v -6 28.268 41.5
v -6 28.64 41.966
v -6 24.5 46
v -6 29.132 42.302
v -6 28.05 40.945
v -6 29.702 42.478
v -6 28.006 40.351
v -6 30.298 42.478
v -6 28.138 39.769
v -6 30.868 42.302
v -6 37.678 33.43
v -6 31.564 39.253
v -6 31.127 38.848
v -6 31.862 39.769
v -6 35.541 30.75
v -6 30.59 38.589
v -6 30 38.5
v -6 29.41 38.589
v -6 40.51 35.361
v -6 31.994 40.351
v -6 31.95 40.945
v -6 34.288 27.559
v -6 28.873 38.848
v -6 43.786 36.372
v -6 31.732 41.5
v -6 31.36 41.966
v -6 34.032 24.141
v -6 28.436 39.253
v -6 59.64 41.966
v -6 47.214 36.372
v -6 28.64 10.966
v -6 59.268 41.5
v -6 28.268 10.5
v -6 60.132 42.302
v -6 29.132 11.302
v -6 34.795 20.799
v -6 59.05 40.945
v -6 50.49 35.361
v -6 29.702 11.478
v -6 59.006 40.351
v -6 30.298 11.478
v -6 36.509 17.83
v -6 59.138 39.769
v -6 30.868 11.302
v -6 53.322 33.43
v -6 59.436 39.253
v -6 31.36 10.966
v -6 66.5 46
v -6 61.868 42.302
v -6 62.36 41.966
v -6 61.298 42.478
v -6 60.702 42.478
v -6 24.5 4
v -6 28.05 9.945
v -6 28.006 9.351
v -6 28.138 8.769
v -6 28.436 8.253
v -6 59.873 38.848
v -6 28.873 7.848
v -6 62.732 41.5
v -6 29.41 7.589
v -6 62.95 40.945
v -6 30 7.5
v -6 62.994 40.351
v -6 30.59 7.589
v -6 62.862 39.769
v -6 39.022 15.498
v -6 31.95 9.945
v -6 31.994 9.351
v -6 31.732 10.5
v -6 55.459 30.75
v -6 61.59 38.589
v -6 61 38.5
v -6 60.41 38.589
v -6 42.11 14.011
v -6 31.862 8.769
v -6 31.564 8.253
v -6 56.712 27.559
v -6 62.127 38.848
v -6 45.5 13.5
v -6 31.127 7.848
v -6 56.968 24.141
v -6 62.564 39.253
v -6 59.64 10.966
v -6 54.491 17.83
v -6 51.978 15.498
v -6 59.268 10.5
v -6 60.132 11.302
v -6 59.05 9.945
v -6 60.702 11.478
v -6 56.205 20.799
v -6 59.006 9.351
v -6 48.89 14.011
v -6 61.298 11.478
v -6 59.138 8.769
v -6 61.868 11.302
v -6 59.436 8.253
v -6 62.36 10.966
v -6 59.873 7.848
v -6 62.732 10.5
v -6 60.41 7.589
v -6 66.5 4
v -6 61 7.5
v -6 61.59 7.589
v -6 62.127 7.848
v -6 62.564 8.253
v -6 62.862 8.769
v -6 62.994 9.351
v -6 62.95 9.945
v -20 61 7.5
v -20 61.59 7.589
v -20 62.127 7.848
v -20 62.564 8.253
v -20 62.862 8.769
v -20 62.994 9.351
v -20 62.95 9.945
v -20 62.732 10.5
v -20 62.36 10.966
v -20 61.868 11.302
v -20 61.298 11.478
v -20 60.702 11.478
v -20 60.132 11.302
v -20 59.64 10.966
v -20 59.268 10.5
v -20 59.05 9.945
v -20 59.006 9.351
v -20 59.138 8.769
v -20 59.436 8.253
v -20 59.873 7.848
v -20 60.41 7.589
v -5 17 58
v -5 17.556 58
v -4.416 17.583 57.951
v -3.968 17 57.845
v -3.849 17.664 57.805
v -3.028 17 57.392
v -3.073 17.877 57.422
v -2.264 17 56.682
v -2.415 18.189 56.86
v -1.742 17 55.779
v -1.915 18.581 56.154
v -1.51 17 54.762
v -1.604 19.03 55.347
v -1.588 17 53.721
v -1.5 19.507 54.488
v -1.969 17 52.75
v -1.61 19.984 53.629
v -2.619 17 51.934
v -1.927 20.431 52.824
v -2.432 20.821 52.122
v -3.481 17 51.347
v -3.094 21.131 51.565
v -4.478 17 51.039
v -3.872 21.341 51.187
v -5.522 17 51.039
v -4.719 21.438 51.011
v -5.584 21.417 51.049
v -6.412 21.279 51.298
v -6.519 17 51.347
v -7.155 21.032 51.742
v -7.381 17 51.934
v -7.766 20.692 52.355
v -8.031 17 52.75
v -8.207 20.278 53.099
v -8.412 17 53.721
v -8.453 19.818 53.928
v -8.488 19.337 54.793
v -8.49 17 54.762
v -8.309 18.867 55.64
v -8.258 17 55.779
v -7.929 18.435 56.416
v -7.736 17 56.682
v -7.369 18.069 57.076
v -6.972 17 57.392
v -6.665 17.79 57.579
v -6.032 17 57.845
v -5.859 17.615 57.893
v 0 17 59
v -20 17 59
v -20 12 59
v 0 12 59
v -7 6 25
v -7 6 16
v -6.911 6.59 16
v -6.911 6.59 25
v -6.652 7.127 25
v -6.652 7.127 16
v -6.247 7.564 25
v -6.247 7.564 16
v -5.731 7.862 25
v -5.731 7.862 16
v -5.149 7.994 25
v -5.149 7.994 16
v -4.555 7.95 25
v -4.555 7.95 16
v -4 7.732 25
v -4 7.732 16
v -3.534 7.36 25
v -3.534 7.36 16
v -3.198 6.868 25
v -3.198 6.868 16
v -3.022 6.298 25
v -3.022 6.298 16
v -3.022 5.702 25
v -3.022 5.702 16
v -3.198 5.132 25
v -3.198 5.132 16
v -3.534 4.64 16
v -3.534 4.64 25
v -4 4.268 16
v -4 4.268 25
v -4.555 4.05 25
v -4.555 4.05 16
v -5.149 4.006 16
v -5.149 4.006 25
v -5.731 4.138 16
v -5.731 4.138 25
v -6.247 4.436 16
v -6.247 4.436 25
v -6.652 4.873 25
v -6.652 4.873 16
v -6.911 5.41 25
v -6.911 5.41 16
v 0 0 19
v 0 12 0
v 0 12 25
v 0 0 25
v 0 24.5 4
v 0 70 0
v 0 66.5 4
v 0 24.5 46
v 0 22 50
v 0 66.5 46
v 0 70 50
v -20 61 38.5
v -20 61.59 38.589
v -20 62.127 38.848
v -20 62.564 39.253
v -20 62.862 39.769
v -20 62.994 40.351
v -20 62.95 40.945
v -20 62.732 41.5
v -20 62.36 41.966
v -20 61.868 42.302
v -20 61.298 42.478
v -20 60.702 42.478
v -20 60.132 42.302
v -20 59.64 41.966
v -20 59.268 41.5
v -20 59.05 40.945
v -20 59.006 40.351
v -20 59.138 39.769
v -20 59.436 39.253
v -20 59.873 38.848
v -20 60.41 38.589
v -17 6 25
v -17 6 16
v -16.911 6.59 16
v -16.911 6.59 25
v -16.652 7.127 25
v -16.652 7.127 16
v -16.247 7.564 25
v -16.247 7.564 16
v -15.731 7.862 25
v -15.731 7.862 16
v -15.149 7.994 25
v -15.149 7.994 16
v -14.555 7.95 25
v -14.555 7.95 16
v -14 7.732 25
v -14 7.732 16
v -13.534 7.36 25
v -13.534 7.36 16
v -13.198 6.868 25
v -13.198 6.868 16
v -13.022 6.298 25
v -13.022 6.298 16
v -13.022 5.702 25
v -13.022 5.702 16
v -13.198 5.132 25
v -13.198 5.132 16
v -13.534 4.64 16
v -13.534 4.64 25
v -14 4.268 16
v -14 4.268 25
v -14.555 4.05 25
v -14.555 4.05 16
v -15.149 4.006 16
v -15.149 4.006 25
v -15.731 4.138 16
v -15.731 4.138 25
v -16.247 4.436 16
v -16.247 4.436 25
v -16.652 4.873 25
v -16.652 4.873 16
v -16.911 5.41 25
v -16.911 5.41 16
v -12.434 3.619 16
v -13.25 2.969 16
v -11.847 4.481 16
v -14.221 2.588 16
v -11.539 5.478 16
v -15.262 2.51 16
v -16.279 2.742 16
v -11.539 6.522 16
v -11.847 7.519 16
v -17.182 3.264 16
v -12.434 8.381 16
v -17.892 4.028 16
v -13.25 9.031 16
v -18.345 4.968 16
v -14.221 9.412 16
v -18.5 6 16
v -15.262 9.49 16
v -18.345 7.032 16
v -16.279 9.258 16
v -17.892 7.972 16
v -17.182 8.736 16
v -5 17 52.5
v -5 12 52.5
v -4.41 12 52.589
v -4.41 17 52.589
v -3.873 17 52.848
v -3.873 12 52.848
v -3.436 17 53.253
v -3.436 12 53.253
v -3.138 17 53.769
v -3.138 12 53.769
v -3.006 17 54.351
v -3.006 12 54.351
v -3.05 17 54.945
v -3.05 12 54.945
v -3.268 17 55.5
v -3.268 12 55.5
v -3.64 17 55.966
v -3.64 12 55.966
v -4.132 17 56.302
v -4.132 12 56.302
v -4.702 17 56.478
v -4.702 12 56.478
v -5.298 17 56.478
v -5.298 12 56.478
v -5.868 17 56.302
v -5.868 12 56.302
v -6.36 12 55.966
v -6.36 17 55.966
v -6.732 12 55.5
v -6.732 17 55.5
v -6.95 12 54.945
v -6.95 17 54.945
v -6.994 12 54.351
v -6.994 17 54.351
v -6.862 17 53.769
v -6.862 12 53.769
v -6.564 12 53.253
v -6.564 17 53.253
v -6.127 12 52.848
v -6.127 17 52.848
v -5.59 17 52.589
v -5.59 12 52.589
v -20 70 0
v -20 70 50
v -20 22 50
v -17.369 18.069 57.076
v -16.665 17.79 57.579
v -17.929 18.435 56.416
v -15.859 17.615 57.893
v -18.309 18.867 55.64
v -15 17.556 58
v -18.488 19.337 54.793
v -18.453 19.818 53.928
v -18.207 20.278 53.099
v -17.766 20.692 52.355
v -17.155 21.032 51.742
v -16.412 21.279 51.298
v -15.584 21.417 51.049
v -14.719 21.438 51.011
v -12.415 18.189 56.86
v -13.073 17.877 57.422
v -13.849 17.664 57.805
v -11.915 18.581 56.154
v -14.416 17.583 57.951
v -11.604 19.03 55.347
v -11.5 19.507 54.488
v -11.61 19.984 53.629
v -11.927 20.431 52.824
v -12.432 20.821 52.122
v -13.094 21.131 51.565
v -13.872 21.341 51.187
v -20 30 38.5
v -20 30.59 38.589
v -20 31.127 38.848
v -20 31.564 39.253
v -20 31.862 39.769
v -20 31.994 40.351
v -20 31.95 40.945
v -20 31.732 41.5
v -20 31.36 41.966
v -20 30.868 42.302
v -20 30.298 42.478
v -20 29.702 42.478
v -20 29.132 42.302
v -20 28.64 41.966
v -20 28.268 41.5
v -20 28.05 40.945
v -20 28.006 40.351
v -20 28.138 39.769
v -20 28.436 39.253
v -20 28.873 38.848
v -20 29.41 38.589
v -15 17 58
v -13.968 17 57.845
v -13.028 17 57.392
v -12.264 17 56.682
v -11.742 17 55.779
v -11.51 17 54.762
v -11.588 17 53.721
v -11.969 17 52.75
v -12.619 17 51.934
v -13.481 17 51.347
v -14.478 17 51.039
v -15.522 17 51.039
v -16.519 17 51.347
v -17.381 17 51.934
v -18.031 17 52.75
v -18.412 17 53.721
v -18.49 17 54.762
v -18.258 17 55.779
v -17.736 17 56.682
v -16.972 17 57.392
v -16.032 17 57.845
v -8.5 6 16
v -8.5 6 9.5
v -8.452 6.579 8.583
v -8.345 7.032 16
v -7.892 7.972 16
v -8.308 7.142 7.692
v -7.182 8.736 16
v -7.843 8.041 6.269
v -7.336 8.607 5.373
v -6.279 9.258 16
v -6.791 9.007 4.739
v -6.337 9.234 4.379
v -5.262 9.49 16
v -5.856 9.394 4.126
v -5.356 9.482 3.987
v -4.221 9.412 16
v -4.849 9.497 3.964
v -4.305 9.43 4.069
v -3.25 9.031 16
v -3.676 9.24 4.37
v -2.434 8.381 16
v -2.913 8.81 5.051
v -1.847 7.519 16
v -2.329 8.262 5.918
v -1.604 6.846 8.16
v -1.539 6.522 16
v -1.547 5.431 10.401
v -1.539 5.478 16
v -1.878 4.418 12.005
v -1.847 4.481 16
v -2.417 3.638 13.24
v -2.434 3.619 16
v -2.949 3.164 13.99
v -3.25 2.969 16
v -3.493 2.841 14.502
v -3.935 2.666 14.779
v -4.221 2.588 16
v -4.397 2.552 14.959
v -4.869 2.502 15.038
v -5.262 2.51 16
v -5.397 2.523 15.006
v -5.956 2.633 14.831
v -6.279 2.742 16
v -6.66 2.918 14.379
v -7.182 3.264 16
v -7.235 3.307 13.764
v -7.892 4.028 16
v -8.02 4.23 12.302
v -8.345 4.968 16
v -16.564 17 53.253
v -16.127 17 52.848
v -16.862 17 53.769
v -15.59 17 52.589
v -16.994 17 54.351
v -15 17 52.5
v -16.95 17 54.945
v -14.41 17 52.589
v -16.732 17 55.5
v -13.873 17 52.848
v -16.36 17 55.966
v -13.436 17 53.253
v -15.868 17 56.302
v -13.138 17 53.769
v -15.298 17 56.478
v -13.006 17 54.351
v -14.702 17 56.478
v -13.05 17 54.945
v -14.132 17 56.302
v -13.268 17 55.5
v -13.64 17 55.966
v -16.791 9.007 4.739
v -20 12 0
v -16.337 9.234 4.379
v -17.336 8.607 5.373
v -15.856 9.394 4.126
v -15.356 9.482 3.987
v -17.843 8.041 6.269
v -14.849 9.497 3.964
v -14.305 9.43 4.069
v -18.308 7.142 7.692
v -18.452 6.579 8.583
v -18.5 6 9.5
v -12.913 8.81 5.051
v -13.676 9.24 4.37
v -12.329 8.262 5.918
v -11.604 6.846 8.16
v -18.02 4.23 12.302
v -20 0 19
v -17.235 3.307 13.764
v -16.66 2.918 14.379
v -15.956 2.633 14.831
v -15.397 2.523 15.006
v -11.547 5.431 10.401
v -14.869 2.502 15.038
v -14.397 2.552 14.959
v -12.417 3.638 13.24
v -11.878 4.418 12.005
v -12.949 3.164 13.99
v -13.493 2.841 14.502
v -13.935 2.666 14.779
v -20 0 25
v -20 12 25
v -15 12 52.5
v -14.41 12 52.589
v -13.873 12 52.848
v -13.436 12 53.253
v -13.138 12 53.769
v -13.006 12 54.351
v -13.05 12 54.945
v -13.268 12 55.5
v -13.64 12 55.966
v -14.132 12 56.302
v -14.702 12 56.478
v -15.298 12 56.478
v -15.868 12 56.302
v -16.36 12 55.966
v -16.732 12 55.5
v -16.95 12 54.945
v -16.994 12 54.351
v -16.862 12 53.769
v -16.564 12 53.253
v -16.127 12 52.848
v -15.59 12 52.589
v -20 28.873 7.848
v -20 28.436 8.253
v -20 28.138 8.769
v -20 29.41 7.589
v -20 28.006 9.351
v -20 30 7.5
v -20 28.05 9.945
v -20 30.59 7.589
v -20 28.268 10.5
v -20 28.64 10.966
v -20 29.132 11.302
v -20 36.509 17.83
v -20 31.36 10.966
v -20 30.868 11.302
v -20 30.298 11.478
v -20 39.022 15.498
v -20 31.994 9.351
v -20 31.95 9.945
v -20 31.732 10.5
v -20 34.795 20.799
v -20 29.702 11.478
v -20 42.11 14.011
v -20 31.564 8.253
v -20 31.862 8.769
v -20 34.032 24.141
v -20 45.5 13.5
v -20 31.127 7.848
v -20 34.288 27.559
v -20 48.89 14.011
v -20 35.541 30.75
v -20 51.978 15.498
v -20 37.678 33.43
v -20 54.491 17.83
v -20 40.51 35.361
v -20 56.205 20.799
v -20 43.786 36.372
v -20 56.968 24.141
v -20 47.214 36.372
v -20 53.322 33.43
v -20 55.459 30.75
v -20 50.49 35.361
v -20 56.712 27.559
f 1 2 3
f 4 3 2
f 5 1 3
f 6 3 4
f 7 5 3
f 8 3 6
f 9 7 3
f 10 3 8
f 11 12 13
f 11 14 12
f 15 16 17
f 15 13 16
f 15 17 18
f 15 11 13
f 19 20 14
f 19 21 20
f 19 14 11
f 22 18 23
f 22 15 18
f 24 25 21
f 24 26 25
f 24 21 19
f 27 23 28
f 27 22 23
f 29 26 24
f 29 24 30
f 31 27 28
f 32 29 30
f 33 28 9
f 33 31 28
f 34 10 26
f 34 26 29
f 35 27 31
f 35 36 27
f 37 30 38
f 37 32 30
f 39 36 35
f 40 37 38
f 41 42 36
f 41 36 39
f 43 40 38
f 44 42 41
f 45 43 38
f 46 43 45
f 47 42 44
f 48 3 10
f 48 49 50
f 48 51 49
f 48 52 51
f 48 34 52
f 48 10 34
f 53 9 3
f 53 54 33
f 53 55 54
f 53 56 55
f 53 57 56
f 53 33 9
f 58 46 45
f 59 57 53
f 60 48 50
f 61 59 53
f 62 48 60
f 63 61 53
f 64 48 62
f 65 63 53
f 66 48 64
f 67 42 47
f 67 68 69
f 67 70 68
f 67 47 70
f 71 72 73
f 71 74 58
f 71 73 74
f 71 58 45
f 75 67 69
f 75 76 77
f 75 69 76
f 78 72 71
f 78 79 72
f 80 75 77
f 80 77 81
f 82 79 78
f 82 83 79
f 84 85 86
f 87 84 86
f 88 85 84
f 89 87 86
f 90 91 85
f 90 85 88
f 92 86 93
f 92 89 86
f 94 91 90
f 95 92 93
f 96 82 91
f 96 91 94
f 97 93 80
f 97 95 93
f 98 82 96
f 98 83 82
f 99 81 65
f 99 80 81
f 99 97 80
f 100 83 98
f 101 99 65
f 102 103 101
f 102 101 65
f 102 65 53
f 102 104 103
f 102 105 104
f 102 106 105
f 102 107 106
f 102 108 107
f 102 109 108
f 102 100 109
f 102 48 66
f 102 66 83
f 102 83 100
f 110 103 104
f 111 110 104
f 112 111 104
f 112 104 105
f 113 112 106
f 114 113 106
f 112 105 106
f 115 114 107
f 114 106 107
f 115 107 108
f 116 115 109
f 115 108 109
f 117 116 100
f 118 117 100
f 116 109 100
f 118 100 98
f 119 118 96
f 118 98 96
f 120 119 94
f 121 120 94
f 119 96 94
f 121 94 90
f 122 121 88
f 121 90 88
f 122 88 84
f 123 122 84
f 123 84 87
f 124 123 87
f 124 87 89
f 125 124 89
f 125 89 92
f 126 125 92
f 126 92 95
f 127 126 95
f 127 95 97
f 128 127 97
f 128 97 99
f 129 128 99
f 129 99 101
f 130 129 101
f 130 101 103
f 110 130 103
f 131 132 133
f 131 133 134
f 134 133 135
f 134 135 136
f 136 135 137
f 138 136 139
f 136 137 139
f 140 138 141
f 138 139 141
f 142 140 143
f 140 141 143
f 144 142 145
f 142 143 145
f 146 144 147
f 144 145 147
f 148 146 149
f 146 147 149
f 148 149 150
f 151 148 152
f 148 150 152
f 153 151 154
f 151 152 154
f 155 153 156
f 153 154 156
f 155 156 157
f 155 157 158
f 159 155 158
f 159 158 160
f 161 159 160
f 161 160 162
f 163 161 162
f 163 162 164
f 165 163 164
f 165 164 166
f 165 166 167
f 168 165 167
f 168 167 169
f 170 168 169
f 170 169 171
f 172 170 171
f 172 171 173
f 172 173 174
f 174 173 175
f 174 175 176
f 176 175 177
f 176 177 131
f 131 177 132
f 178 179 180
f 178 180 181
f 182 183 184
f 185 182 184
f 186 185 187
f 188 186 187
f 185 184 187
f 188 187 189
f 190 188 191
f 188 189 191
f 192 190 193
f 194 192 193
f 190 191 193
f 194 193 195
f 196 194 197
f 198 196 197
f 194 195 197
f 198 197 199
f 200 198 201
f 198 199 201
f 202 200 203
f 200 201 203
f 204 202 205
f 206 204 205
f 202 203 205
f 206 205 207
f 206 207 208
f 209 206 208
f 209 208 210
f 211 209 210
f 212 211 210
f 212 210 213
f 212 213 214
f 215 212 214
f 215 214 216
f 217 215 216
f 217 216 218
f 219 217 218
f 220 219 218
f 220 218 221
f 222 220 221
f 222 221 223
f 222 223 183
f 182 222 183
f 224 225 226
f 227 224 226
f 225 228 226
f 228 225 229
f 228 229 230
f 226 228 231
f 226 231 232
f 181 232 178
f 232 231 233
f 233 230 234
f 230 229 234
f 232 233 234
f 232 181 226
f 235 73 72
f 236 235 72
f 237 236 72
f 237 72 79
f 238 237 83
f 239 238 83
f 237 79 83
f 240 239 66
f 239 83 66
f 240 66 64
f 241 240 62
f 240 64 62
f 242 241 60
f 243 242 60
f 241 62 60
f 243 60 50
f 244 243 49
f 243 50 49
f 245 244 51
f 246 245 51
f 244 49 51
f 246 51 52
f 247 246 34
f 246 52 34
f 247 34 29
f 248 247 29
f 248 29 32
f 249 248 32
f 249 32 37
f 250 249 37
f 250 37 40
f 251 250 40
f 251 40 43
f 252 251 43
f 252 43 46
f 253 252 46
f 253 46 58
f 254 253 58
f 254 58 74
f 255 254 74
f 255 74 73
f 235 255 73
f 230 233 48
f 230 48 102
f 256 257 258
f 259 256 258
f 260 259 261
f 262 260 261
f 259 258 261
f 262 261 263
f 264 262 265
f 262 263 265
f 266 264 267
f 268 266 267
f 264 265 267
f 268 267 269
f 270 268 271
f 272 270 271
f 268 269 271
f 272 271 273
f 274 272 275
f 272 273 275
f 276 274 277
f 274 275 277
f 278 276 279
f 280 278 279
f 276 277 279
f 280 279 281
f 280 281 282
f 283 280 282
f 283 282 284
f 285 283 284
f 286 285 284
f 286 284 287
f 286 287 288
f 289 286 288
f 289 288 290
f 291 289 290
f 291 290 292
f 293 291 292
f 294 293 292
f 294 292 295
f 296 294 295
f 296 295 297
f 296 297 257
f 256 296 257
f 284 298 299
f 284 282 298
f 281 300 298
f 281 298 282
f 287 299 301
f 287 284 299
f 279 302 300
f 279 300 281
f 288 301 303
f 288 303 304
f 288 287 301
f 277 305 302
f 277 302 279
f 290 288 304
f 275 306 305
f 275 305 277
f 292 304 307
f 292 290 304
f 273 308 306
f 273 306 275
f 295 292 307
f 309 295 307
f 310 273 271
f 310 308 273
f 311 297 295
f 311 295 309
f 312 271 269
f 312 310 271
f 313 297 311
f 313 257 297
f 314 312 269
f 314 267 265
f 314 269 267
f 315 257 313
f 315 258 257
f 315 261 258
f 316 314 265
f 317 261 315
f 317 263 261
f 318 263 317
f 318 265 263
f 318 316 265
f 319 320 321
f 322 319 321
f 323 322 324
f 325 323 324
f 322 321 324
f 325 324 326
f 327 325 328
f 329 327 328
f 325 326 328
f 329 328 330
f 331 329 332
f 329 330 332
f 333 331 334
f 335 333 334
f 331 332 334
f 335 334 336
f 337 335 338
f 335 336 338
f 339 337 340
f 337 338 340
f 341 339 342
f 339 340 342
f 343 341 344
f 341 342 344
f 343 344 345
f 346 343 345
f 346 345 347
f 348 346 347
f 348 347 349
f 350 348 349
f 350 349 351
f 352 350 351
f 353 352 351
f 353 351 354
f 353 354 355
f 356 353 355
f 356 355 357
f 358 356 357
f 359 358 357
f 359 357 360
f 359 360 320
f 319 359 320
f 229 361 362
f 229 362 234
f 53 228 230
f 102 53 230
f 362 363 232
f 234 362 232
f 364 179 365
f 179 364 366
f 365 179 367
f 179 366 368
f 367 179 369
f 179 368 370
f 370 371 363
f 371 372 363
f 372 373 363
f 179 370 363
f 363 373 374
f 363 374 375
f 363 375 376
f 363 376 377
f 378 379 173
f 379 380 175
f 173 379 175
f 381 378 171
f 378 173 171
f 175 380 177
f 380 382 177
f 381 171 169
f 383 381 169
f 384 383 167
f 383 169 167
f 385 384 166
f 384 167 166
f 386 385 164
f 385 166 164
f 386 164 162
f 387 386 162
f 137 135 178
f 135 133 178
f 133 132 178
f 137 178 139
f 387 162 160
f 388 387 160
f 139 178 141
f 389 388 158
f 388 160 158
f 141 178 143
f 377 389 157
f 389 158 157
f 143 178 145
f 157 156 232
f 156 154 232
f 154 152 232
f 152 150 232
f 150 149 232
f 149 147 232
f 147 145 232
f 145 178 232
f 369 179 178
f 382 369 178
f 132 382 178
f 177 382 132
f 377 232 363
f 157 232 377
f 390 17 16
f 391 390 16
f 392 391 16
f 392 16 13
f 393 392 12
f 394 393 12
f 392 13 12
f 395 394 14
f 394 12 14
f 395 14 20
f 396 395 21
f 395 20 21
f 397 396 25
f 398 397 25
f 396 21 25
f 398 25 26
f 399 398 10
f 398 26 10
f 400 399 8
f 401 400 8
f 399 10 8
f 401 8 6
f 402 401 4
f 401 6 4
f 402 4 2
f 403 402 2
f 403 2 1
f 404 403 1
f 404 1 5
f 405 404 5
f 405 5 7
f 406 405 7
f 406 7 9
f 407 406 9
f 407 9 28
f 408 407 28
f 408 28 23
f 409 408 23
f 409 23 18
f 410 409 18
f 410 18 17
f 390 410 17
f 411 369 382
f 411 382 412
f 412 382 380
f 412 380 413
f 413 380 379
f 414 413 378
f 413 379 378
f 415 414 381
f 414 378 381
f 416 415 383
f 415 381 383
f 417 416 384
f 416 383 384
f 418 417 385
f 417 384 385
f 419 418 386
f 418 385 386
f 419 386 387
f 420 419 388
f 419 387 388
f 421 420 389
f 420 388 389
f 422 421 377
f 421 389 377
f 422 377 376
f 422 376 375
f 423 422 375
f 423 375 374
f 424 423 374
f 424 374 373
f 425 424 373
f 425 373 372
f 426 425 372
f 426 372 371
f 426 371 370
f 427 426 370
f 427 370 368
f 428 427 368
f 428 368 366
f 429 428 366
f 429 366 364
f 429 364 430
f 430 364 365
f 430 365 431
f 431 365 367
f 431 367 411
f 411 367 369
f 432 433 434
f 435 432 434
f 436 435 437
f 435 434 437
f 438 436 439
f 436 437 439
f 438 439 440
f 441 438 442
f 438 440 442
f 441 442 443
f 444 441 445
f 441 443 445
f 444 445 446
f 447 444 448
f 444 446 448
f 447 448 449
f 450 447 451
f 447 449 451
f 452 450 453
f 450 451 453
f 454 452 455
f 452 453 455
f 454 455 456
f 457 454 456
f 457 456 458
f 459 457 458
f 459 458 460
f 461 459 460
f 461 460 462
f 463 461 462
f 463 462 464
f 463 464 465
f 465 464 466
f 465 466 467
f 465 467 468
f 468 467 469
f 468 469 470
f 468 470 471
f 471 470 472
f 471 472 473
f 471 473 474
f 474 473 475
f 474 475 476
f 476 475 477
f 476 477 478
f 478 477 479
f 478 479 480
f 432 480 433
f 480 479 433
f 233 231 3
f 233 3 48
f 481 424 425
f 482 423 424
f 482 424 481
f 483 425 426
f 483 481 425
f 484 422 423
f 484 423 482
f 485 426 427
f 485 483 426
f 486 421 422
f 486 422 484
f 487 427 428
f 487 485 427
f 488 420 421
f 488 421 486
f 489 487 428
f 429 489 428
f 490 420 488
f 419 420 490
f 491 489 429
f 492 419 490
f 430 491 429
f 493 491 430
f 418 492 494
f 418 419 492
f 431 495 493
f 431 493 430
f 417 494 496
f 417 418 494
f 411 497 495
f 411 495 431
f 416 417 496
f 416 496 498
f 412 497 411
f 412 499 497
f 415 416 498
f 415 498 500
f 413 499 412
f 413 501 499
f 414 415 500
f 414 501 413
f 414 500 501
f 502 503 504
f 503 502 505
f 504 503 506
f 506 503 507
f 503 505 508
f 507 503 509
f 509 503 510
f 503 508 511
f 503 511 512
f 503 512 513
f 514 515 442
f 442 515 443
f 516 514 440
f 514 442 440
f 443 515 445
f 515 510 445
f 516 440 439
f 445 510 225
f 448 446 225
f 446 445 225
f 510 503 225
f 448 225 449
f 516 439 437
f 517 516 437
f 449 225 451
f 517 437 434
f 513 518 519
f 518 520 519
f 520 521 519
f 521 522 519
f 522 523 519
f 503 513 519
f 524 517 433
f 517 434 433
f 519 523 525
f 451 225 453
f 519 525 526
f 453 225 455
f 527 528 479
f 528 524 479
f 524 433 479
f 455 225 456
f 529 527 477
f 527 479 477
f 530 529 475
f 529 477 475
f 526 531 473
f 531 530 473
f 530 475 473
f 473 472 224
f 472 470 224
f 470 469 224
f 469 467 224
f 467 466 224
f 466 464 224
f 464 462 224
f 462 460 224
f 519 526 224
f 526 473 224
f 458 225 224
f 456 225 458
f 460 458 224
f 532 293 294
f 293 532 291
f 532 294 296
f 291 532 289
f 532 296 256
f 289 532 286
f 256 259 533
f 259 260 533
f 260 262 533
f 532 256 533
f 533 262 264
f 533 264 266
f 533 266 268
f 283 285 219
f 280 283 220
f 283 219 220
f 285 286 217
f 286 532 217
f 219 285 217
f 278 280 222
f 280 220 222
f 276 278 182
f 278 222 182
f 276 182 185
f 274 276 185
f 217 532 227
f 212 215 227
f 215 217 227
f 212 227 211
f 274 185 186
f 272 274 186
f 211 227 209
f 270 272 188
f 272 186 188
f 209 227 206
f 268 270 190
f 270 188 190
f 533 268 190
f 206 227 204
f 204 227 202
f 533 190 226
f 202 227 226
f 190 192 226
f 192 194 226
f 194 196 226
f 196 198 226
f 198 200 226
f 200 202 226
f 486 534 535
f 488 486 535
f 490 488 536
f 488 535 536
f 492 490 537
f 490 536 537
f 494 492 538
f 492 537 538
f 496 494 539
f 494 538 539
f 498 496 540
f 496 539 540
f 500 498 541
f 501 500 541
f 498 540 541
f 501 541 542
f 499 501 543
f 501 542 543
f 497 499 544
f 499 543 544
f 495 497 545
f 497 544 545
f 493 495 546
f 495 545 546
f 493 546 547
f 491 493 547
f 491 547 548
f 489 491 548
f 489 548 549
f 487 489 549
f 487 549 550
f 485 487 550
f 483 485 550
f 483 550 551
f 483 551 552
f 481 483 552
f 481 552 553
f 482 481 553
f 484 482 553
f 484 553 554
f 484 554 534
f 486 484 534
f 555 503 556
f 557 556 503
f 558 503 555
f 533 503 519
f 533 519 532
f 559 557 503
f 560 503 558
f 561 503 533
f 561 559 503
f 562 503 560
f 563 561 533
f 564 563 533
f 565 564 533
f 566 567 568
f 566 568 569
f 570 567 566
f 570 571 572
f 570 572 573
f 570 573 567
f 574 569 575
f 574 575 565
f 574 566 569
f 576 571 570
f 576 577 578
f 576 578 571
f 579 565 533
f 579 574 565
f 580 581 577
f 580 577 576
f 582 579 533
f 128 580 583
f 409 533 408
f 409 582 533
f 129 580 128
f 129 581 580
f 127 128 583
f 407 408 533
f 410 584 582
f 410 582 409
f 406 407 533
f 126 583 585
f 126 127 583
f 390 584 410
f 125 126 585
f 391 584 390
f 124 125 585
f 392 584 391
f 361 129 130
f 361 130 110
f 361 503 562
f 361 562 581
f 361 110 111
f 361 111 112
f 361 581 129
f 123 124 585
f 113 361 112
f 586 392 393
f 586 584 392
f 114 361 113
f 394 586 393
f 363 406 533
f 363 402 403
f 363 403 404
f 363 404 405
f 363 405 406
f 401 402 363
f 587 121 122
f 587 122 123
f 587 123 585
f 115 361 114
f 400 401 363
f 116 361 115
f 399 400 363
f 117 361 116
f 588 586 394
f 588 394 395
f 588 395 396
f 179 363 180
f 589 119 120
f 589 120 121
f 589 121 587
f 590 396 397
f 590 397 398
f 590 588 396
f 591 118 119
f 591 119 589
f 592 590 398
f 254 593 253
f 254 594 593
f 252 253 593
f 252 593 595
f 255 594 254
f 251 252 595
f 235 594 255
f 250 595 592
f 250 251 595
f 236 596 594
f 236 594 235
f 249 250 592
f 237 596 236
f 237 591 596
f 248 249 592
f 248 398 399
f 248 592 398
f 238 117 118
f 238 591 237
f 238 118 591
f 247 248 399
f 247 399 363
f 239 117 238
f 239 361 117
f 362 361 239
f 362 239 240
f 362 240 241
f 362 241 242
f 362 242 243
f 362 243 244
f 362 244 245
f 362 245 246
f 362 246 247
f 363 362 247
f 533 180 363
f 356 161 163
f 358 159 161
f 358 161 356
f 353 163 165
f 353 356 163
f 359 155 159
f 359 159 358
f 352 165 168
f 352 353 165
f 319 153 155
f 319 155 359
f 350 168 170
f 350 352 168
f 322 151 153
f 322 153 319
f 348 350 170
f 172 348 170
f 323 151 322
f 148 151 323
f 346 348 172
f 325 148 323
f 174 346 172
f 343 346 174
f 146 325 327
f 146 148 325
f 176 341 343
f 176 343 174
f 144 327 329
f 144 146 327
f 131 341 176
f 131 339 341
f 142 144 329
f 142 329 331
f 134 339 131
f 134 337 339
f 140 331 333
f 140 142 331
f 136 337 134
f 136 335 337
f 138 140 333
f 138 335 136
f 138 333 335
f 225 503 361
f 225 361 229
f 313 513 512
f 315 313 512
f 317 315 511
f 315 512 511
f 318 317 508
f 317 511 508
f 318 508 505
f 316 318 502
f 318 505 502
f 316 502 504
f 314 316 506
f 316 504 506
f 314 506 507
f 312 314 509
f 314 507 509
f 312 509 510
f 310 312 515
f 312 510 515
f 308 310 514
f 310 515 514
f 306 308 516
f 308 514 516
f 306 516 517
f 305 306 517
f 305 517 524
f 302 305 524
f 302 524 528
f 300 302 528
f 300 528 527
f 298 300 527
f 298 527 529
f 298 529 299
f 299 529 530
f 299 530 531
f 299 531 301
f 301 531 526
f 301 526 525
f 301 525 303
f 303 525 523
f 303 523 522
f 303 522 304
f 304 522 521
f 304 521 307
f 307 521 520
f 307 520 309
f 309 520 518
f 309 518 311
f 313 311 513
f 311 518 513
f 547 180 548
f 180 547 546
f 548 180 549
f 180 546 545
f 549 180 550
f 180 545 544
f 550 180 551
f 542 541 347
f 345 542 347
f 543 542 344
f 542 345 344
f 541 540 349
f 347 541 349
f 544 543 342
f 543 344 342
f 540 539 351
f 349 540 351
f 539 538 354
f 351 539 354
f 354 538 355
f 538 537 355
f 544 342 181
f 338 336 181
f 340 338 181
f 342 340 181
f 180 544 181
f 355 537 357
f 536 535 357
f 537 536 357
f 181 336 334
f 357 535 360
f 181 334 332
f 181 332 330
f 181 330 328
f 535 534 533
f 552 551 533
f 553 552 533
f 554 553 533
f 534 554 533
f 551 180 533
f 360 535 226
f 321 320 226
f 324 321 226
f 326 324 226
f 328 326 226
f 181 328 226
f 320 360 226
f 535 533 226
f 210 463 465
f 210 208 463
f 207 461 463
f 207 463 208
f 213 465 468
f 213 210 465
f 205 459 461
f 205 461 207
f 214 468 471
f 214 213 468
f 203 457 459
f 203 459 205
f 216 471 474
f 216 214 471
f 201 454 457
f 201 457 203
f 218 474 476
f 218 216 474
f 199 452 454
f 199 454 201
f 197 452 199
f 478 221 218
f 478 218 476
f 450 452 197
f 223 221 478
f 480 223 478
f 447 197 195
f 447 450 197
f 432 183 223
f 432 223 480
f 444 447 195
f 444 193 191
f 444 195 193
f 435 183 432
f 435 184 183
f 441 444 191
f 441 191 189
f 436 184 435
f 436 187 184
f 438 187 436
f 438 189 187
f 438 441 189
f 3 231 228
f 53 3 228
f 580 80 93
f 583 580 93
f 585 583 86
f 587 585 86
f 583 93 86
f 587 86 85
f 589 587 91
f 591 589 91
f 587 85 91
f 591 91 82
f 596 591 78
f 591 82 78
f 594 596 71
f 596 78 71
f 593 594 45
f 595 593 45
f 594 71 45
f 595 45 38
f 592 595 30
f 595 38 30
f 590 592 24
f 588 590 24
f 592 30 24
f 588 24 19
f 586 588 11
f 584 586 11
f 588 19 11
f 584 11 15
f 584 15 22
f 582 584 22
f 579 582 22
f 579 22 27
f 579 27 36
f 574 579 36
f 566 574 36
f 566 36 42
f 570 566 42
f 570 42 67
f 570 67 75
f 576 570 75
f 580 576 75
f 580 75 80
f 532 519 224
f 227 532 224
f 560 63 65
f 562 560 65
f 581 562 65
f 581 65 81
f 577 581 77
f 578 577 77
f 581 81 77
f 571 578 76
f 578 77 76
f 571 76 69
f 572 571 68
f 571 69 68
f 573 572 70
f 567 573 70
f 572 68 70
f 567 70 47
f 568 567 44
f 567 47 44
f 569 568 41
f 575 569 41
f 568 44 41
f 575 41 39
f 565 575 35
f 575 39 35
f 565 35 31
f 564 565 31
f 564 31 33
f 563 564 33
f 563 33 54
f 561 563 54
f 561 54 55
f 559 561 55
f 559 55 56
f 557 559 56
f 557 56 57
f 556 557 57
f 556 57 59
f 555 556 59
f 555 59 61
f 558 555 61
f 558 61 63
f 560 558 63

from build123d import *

# Parameters (mm, degrees)
SKETCH1_W           = 20
SKETCH1_H           = 50
BOSS_EXTRUDE1_DEPTH = 70
SKETCH2_R           = 2
SKETCH2_R_2         = 11.5
CUT_EXTRUDE2_DEPTH  = 60
SKETCH4_W           = 25
SKETCH4_H           = 12
CUT_EXTRUDE3_DEPTH  = 60
SKETCH8_R           = 2
CUT_EXTRUDE5_DEPTH  = 15
SKETCH9_W           = 42
SKETCH9_H           = 42
CUT_EXTRUDE6_DEPTH  = 6
CUT_EXTRUDE8_DEPTH  = 30
SKETCH12_W          = 20
SKETCH12_H          = 5
BOSS_EXTRUDE2_DEPTH = 9
BOSS_EXTRUDE3_DEPTH = 20
SKETCH15_R          = 2
CUT_EXTRUDE9_DEPTH  = 10
SKETCH18_R          = 3.5
CUT_EXTRUDE12_DEPTH = 53
SKETCH17_R          = 3.5
CUT_EXTRUDE13_DEPTH = 16
SKETCH19_R          = 2
CUT_EXTRUDE14_DEPTH = 25


with BuildPart() as part:
    # Sketch1 → Boss-Extrude1 (new body)
    with BuildSketch(Plane(origin=(0, 0, 0), x_dir=(1, 0, 0), z_dir=(0, 1, 0))):
        with Locations((-10, -25)):
            Rectangle(SKETCH1_W, SKETCH1_H)
    extrude(amount=BOSS_EXTRUDE1_DEPTH)

    # Sketch2 → Cut-Extrude2 (cut)
    with BuildSketch(Plane(origin=(0, 0, 0), x_dir=(0, 0, -1), z_dir=(1, 0, 0))):
        with Locations((-9.5, 61)):
            Circle(SKETCH2_R)
        with Locations((-25, 45.5)):
            Circle(SKETCH2_R_2)
        with Locations((-9.5, 30)):
            Circle(SKETCH2_R)
        with Locations((-40.5, 30)):
            Circle(SKETCH2_R)
        with Locations((-40.5, 61)):
            Circle(SKETCH2_R)
    extrude(amount=-CUT_EXTRUDE2_DEPTH, mode=Mode.SUBTRACT)

    # Sketch4 → Cut-Extrude3 (cut)
    with BuildSketch(Plane(origin=(0, 0, 0), x_dir=(0, 0, -1), z_dir=(1, 0, 0))):
        with Locations((-37.5, 6)):
            Rectangle(SKETCH4_W, SKETCH4_H)
    extrude(amount=-CUT_EXTRUDE3_DEPTH, mode=Mode.SUBTRACT)

    # Sketch8 → Cut-Extrude5 (cut)
    with BuildSketch(Plane(origin=(0, 0, 0), x_dir=(-1, 0, 0), z_dir=(0, 0, -1))):
        with Locations((15, 6)):
            Circle(SKETCH8_R)
        with Locations((5, 6)):
            Circle(SKETCH8_R)
    extrude(amount=-CUT_EXTRUDE5_DEPTH, mode=Mode.SUBTRACT)

    # Sketch9 → Cut-Extrude6 (cut)
    with BuildSketch(Plane(origin=(0, 0, 0), x_dir=(0, 0, -1), z_dir=(1, 0, 0))):
        with Locations((-25, 45.5)):
            Rectangle(SKETCH9_W, SKETCH9_H)
    extrude(amount=-CUT_EXTRUDE6_DEPTH, mode=Mode.SUBTRACT)

    # Sketch11 → Cut-Extrude8 (cut)
    with BuildSketch(Plane(origin=(0, 0, 0), x_dir=(0, 0, -1), z_dir=(1, 0, 0))):
        Polygon((-19, 0), (0, 0), (0, 12), align=None)
    extrude(amount=-CUT_EXTRUDE8_DEPTH, mode=Mode.SUBTRACT)

    # Sketch12 → Boss-Extrude2 (add)
    with BuildSketch(Plane.XY.offset(50)):
        with Locations((-10, 14.5)):
            Rectangle(SKETCH12_W, SKETCH12_H)
    extrude(amount=BOSS_EXTRUDE2_DEPTH)

    # Sketch14 → Boss-Extrude3 (add)
    with BuildSketch(Plane(origin=(0, 0, 0), x_dir=(0, 0, -1), z_dir=(1, 0, 0))):
        Polygon((-50, 17), (-59, 17), (-50, 22), align=None)
    extrude(amount=-BOSS_EXTRUDE3_DEPTH)

    # Sketch15 → Cut-Extrude9 (cut)
    with BuildSketch(Plane(origin=(0, 12, 0), x_dir=(-1, 0, 0), z_dir=(0, -1, 0))):
        with Locations(Location((5, -54.5, 0), (0, 0, 90))):
            Circle(SKETCH15_R)
        with Locations(Location((15, -54.5, 0), (0, 0, 90))):
            Circle(SKETCH15_R)
    extrude(amount=-CUT_EXTRUDE9_DEPTH, mode=Mode.SUBTRACT)

    # Sketch18 → Cut-Extrude12 (cut)
    with BuildSketch(Plane(origin=(0, 70, 0), x_dir=(1, 0, 0), z_dir=(0, 1, 0))):
        with Locations(Location((-15, -54.5, 0), (0, 0, 270))):
            Circle(SKETCH18_R)
        with Locations(Location((-5, -54.5, 0), (0, 0, 270))):
            Circle(SKETCH18_R)
    extrude(amount=-CUT_EXTRUDE12_DEPTH, mode=Mode.SUBTRACT)

    # Sketch17 → Cut-Extrude13 (cut)
    with BuildSketch(Plane(origin=(0, 0, 0), x_dir=(-1, 0, 0), z_dir=(0, 0, -1))):
        with Locations((15, 6)):
            Circle(SKETCH17_R)
        with Locations((5, 6)):
            Circle(SKETCH17_R)
    extrude(amount=-CUT_EXTRUDE13_DEPTH, mode=Mode.SUBTRACT)

    # Sketch19 → Cut-Extrude14 (cut)
    with BuildSketch(Plane(origin=(0, 0, 16), x_dir=(-1, 0, 0), z_dir=(0, 0, -1))):
        with Locations((5, 6)):
            Circle(SKETCH19_R)
        with Locations((15, 6)):
            Circle(SKETCH19_R)
    extrude(amount=-CUT_EXTRUDE14_DEPTH, mode=Mode.SUBTRACT)


solid = part.part
